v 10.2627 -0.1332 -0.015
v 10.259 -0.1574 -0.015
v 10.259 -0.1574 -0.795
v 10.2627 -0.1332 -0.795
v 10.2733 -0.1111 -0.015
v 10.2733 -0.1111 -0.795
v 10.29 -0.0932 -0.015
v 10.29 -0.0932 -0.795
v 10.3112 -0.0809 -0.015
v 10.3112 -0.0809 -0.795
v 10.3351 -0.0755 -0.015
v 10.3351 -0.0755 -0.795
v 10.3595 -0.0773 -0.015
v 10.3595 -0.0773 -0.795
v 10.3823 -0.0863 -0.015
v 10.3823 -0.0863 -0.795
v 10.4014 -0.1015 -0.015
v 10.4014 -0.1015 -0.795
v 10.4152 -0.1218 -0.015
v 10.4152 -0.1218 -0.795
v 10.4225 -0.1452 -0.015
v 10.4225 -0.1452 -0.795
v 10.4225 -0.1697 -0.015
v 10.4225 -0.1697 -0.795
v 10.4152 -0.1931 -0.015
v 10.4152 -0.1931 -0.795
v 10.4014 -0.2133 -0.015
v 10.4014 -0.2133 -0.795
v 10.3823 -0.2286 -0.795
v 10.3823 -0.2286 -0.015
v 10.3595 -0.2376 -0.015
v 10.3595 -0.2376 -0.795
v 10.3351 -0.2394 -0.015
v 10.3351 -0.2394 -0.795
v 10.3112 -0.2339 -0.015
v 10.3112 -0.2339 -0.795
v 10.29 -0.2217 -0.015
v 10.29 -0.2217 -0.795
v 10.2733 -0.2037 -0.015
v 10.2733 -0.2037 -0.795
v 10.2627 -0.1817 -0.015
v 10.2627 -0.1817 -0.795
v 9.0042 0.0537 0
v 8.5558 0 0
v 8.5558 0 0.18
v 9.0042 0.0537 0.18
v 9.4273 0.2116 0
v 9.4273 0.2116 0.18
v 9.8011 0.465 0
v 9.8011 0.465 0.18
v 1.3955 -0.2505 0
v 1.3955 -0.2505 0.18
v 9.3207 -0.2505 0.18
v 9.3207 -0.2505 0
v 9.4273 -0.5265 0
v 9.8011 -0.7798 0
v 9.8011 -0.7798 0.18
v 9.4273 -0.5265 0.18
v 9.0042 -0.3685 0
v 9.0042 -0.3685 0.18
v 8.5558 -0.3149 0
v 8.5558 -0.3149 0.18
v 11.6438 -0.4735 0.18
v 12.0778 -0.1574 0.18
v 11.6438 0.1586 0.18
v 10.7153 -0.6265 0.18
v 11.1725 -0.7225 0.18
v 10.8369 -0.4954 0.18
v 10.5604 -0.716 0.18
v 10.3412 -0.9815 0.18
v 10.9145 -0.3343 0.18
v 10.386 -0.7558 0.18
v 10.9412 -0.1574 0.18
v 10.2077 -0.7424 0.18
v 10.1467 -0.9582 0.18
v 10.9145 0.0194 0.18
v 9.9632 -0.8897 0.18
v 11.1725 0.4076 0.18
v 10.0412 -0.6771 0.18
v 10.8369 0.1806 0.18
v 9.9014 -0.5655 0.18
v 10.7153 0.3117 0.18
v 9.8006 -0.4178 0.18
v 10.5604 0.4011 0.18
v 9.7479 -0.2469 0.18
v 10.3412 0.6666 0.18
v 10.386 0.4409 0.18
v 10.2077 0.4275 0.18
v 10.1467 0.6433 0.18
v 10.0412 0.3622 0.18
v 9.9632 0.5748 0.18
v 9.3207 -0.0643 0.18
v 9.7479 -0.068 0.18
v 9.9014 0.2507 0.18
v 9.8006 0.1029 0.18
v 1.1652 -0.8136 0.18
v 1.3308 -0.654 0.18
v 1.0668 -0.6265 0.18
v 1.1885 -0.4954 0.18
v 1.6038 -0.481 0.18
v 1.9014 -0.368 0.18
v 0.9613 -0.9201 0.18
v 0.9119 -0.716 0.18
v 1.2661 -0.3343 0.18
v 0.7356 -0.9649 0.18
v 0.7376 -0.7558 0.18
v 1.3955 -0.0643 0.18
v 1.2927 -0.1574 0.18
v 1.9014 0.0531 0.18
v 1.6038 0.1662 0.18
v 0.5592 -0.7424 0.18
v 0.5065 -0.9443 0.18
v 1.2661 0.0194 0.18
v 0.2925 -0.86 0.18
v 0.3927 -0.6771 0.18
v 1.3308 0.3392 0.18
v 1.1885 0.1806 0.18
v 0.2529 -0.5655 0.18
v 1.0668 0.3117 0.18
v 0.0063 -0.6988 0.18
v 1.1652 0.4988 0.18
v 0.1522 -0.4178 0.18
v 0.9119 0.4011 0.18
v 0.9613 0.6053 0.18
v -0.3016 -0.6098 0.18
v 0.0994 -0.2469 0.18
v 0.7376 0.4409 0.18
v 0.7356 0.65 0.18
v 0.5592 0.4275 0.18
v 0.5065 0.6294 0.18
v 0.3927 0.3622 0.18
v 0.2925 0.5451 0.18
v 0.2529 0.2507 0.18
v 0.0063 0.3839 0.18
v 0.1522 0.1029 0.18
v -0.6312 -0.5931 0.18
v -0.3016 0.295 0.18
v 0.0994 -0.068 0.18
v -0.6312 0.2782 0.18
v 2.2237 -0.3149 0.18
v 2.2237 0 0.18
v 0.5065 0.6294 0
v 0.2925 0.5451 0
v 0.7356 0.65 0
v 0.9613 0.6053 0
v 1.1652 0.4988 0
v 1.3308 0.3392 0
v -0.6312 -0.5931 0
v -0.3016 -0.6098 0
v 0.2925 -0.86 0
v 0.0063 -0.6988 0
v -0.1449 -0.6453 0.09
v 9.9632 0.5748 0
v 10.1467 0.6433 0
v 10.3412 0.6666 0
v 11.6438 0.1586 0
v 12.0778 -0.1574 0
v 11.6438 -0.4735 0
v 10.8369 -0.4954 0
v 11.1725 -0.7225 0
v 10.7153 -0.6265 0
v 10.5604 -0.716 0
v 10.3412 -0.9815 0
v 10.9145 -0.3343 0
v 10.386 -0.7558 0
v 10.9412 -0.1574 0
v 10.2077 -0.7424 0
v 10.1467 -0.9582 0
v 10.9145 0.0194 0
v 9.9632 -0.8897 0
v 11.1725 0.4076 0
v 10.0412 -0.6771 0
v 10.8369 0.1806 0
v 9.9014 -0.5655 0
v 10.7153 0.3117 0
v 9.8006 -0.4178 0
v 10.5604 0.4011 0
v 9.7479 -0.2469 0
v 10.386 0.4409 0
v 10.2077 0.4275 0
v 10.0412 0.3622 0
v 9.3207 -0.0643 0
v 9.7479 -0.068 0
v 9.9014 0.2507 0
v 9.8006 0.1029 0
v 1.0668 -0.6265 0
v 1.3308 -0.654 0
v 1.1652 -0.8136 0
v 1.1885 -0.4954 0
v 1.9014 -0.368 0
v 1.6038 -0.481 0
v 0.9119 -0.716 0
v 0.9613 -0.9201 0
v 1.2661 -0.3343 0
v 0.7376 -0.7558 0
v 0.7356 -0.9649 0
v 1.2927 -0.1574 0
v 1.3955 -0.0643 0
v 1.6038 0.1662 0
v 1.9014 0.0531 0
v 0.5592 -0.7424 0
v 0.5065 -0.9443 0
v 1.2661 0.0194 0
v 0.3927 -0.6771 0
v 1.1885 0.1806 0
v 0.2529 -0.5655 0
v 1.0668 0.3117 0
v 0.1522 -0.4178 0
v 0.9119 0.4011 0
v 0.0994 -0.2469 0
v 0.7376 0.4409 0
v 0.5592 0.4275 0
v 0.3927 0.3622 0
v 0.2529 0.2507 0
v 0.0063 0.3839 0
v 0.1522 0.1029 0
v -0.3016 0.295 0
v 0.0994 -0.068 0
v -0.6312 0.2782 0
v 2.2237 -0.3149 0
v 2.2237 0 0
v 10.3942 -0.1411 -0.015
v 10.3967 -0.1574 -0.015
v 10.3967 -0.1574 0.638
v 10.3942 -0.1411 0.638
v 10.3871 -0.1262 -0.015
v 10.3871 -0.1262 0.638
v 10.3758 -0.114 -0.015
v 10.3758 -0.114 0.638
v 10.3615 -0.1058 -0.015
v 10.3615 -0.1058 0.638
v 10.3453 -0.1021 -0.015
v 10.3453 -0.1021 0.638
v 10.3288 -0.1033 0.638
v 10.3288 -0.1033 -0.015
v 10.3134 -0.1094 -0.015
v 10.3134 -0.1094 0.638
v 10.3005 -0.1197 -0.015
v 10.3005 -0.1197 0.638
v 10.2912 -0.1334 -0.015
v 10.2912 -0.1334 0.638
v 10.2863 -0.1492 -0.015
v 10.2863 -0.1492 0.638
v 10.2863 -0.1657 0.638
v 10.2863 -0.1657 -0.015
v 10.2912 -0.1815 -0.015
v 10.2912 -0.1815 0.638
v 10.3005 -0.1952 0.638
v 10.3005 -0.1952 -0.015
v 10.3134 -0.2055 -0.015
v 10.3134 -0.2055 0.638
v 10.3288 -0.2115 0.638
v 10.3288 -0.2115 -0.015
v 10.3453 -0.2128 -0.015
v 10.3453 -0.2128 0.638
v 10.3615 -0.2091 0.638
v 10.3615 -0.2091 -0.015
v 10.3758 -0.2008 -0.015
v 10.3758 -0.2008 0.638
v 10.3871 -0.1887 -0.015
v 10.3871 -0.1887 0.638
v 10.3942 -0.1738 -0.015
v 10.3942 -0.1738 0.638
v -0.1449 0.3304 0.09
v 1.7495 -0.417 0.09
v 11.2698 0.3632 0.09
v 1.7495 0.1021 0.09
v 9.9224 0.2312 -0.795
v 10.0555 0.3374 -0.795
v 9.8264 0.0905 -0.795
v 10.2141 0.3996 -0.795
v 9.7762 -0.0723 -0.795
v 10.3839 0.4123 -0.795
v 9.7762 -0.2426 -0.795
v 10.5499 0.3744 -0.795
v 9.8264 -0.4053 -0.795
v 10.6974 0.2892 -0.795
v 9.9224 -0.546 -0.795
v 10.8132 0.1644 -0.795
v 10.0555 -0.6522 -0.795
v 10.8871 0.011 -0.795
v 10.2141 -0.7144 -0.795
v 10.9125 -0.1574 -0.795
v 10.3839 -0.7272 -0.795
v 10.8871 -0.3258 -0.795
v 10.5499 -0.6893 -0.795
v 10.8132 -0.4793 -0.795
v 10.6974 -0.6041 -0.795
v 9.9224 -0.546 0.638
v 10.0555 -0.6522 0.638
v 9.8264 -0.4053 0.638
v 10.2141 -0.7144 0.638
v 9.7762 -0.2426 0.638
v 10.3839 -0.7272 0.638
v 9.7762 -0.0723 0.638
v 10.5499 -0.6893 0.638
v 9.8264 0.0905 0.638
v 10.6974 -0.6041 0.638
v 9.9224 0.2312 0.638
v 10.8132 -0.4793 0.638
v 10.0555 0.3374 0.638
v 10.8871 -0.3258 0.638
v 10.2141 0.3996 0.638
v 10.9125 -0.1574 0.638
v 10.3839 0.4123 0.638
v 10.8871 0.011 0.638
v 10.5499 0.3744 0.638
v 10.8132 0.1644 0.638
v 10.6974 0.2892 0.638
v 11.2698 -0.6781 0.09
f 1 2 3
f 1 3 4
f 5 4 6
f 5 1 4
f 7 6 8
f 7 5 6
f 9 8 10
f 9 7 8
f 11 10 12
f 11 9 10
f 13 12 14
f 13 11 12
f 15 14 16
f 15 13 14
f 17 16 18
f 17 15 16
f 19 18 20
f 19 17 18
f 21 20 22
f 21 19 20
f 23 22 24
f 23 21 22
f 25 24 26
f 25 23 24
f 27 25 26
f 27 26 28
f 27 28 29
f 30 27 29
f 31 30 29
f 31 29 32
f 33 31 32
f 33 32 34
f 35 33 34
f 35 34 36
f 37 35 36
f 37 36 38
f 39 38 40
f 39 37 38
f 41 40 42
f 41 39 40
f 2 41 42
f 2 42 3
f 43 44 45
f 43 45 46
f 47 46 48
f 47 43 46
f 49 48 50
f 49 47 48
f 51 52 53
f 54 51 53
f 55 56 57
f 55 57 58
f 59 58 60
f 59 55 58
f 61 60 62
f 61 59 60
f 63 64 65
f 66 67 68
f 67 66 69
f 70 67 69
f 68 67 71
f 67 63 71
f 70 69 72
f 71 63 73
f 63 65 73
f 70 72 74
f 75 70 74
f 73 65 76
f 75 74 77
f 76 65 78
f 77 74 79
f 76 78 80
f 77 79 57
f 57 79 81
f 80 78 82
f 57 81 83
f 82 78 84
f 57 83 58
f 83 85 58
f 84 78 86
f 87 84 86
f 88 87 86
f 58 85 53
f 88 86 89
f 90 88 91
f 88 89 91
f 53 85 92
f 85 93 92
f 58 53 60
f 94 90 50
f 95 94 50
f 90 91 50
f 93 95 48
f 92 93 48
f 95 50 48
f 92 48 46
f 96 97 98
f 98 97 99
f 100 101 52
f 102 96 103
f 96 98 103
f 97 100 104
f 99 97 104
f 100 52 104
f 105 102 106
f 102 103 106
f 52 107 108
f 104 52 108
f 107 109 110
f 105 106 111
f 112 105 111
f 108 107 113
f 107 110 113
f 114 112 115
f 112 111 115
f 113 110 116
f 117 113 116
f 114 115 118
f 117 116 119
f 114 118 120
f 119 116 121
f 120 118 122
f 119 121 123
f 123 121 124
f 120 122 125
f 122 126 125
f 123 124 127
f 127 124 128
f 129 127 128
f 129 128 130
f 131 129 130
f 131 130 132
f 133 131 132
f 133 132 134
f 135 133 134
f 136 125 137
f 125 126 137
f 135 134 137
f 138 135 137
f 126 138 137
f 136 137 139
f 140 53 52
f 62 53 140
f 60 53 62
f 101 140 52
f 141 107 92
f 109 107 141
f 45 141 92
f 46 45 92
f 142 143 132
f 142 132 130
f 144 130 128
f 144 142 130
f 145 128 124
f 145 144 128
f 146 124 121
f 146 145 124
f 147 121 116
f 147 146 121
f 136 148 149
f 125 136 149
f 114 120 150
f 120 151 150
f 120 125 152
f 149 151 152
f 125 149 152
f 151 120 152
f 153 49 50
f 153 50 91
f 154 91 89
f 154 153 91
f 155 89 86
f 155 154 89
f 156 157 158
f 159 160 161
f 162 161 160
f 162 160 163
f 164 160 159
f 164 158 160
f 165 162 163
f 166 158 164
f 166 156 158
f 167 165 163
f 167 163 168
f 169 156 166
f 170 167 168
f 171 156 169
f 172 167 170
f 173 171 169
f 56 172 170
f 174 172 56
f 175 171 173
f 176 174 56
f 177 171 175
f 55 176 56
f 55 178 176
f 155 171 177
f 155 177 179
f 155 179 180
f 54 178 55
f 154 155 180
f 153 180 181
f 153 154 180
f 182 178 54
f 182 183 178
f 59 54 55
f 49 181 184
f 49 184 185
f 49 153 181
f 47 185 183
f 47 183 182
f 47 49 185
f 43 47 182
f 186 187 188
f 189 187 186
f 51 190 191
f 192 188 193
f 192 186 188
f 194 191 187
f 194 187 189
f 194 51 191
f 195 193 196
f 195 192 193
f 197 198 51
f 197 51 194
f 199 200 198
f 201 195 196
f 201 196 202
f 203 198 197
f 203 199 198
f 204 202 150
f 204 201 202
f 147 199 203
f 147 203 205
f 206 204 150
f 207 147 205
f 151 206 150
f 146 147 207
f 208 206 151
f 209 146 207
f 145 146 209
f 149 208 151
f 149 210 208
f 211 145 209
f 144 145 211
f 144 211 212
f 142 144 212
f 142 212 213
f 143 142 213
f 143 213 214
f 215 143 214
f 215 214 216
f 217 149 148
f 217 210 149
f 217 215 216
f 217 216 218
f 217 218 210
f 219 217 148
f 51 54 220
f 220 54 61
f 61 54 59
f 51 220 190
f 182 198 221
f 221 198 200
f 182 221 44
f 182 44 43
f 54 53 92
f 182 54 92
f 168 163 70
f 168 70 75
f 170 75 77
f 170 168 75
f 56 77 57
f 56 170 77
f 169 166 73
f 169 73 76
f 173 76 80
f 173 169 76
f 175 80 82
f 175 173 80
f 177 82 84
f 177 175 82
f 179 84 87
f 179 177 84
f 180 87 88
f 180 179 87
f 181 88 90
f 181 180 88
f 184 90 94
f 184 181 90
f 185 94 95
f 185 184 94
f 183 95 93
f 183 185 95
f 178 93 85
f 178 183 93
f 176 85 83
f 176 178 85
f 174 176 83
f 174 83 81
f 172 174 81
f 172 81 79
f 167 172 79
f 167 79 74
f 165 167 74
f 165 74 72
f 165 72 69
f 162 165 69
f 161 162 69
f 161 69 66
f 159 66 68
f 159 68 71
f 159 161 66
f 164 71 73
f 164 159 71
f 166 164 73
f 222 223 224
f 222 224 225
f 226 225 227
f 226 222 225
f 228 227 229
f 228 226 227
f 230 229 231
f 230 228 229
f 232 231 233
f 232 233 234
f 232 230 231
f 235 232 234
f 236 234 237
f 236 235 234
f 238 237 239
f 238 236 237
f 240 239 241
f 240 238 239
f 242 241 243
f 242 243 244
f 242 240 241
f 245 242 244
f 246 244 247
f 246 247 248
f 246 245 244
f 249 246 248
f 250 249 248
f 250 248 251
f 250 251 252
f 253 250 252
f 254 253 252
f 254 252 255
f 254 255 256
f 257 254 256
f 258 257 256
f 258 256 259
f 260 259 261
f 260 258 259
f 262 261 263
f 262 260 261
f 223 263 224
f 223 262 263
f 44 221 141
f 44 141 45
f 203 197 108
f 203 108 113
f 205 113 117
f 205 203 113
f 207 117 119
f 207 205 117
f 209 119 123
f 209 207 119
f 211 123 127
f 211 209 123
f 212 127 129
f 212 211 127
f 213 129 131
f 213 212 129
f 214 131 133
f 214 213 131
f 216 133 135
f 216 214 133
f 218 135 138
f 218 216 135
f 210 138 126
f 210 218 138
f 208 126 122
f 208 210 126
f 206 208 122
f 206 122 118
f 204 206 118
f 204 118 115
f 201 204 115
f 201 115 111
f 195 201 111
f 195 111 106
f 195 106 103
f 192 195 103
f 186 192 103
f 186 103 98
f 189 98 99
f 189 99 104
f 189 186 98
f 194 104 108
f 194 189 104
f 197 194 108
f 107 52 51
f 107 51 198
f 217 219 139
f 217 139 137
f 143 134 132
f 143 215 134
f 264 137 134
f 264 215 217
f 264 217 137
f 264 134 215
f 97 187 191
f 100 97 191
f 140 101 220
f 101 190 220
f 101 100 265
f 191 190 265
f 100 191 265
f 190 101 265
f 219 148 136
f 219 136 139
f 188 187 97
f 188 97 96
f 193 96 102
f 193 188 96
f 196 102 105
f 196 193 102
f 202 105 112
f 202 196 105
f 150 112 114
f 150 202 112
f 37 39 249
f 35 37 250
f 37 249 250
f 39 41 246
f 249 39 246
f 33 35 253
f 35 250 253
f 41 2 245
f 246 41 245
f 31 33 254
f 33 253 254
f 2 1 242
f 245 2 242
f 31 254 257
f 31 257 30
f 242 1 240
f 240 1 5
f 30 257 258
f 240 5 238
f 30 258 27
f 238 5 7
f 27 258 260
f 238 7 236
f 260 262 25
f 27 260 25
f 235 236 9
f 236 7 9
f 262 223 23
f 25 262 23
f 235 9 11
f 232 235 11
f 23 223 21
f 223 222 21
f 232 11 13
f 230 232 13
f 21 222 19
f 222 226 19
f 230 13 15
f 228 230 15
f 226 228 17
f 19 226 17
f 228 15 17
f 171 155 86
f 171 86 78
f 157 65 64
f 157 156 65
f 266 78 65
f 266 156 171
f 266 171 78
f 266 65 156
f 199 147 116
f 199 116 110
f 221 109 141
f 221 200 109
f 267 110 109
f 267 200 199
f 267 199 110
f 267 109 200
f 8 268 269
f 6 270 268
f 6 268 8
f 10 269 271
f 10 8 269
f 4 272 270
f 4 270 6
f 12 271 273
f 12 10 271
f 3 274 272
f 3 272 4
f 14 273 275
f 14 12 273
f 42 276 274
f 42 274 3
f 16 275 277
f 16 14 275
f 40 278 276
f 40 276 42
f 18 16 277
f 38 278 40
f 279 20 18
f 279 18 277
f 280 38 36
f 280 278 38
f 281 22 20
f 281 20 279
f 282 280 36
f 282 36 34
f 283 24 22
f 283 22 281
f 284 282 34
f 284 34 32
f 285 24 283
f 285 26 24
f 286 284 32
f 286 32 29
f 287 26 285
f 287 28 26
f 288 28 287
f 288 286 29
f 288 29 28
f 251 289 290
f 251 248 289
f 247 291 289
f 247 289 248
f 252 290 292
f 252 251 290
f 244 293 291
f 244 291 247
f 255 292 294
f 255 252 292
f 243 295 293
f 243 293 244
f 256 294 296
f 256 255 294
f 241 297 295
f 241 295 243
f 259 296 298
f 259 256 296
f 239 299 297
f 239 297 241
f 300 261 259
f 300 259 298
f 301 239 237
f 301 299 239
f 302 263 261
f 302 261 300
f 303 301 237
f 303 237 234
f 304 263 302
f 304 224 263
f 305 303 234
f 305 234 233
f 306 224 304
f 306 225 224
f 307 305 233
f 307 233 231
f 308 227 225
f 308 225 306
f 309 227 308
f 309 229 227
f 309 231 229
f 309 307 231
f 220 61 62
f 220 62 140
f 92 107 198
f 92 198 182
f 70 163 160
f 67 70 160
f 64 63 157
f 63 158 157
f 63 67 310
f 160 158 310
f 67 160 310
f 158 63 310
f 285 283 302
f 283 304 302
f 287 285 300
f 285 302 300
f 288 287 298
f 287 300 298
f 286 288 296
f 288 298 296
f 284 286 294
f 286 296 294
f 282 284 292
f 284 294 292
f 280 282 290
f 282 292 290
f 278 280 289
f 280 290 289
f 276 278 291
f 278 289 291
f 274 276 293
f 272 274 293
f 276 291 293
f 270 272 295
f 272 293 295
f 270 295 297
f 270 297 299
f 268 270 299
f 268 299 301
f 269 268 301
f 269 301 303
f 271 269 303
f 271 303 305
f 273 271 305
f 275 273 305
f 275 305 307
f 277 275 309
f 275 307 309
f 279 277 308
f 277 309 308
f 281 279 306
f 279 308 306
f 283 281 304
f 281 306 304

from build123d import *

# Parameters (mm, degrees)
ESQUISSE1_R             = 0.6
BOSS_EXTRU_1_DEPTH      = 0.18
ESQUISSE2_W             = 7.925210263
ESQUISSE2_H             = 0.186225418
ENL_V_MAT_EXTRU_1_DEPTH = 0.18
BOSS_EXTRU_2_DEPTH      = 0.458
BOSS_EXTRU_2_DEPTH_BACK = 0.195
ESQUISSE3_R             = 0.571329139
ESQUISSE3_R_2           = 0.055500224
ESQUISSE4_R             = 0.571329139
ESQUISSE4_R_2           = 0.082184666
BOSS_EXTRU_3_DEPTH      = 0.78


with BuildPart() as part:
    # Esquisse1 → Boss.-Extru.1 (new body)
    with BuildSketch(Plane.XY):
        with BuildLine():
            Line((2.223699387, 0), (8.555848237, 0))
            ThreePointArc((8.555848237, 0), (9.220464403, 0.120032205), (9.801106522, 0.464962786))
            ThreePointArc((9.801106522, 0.464962786), (10.052940049, 0.61456455), (10.341194426, 0.666624385))
            add(Edge.make_bspline(
                [(10.341194426, 0.666624385), (11.330037109, 0.471790516), (12.077784431, -0.157435194)],
                knots=[0, 0, 0, 1, 1, 1], degree=2))
            add(Edge.make_bspline(
                [(10.341194426, -0.981494774), (11.330037109, -0.786660904), (12.077784431, -0.157435194)],
                knots=[0, 0, 0, 1, 1, 1], degree=2))
            ThreePointArc((10.341194426, -0.981494774), (10.052940049, -0.929434938), (9.801106522, -0.779833175))
            ThreePointArc((9.801106522, -0.779833175), (9.220464403, -0.434902593), (8.555848237, -0.314870389))
            Line((8.555848237, -0.314870389), (2.223699387, -0.314870389))
            add(Edge.make_bspline(
                [(1.330849564, -0.654046001), (1.721823908, -0.349562315), (2.223699387, -0.314870389)],
                knots=[0, 0, 0, 1, 1, 1], degree=2))
            ThreePointArc((1.330849564, -0.654046001), (0.85005841, -0.950565912), (0.292489664, -0.860004965))
            add(Edge.make_bspline(
                [(-0.631189968, -0.593117735), (-0.120424132, -0.564042379), (0.292489664, -0.860004965)],
                knots=[0, 0, 0, 1, 1, 1], degree=2))
            Line((-0.631189968, -0.593117735), (-0.631189968, 0.278247347))
            add(Edge.make_bspline(
                [(-0.631189968, 0.278247347), (-0.120424132, 0.24917199), (0.292489664, 0.545134577)],
                knots=[0, 0, 0, 1, 1, 1], degree=2))
            ThreePointArc((0.292489664, 0.545134577), (0.85005841, 0.635695523), (1.330849564, 0.339175613))
            add(Edge.make_bspline(
                [(1.330849564, 0.339175613), (1.721823908, 0.034691927), (2.223699387, 0)],
                knots=[0, 0, 0, 1, 1, 1], degree=2))
        make_face()
        with Locations((10.341194426, -0.157435194)):
            Circle(ESQUISSE1_R, mode=Mode.SUBTRACT)
        with Locations((0.69274072, -0.157435194)):
            Circle(ESQUISSE1_R, mode=Mode.SUBTRACT)
    extrude(amount=BOSS_EXTRU_1_DEPTH)

    # Esquisse2 → Enlèv. mat.-Extru.1 (cut)
    with BuildSketch(Plane.XY.offset(0.18)):
        with Locations((5.358097221, -0.157435194)):
            Rectangle(ESQUISSE2_W, ESQUISSE2_H)
    extrude(amount=-ENL_V_MAT_EXTRU_1_DEPTH, mode=Mode.SUBTRACT)


with BuildPart() as body_2:
    # Esquisse3 → Boss.-Extru.2 (new, two sides: drawn at the far end of the back side and taken through both)
    with BuildSketch(Plane.XY.offset(0.18).offset(-BOSS_EXTRU_2_DEPTH_BACK)):
        with Locations((10.341194426, -0.157435194)):
            Circle(ESQUISSE3_R)
        with Locations((10.341194426, -0.157435194)):
            Circle(ESQUISSE3_R_2, mode=Mode.SUBTRACT)
    extrude(amount=BOSS_EXTRU_2_DEPTH + BOSS_EXTRU_2_DEPTH_BACK)

    # Esquisse4 → Boss.-Extru.3 (add)
    with BuildSketch(Plane(origin=(0, 0, -0.015), x_dir=(-1, 0, 0), z_dir=(0, 0, -1))):
        with Locations(Location((-10.341194426, -0.157435194, 0), (0, 0, 180))):
            Circle(ESQUISSE4_R)
        with Locations((-10.341194426, -0.157435194)):
            Circle(ESQUISSE4_R_2, mode=Mode.SUBTRACT)
    extrude(amount=BOSS_EXTRU_3_DEPTH)


solid = Compound([part.part, body_2.part])
